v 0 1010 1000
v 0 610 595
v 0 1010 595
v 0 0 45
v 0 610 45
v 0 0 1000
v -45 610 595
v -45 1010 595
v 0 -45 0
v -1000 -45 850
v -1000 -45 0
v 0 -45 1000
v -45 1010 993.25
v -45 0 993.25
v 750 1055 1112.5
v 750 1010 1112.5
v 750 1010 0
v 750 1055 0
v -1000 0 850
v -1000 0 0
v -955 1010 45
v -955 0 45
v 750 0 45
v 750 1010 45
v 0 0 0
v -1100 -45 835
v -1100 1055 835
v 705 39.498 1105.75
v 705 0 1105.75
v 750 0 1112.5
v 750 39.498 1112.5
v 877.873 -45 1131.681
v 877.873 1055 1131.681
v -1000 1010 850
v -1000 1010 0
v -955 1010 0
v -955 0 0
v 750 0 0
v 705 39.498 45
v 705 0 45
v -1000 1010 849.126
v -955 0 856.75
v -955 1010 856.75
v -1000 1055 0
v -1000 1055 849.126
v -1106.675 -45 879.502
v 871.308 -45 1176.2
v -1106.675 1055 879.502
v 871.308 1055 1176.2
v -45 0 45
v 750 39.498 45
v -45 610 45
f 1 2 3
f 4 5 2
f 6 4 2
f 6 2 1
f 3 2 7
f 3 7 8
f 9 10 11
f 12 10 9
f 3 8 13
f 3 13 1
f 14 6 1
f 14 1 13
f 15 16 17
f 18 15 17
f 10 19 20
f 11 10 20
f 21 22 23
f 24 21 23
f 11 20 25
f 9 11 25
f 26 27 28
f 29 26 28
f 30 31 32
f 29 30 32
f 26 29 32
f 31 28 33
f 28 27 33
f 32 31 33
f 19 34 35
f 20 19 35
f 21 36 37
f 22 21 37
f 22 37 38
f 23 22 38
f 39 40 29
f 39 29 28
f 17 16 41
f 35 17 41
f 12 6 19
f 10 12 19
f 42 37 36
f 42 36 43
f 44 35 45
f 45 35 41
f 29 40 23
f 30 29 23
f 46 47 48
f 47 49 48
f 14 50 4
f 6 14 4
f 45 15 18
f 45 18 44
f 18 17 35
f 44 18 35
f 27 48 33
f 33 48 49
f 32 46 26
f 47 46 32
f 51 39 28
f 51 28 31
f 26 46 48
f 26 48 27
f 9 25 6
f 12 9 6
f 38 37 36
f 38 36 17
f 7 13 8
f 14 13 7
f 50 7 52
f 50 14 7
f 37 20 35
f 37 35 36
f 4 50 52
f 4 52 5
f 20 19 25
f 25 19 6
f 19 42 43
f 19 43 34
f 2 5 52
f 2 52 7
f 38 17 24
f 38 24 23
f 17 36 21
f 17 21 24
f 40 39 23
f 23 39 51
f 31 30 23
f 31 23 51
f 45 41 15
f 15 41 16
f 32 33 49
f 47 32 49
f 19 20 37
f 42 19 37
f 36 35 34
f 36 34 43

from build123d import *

# Parameters (mm, degrees)
F1_DEPTH  = 1010
F2_DEPTH  = 1055
F3_DEPTH  = 45
F5_DEPTH  = 45
F6_W      = 400
F6_H      = 550
F7_DEPTH  = 45
F8_W      = 1705
F8_H      = 1010
F9_DEPTH  = 45
F10_W     = 45
F10_H     = 39.4975058734
F11_DEPTH = 1067.5
F13_DEPTH = 45


with BuildPart() as f1:
    # F0 (on Front) → F1 (new body)
    with BuildSketch(Plane.XZ):
        Polygon((-955, 0), (-955, 856.75), (-1000, 850), (-1000, 0), align=None)
    extrude(amount=-F1_DEPTH)


with BuildPart() as f1b:
    # F0 (on Front) → F1, piece 2 (new body)
    with BuildSketch(Plane.XZ):
        Polygon((0, 45), (0, 1000), (-45, 993.25), (-45, 45), align=None)
    extrude(amount=-F1_DEPTH)

    # F6 (on face) → F7 (cut, through all)
    with BuildSketch(Plane.YZ):
        with Locations((810, 320)):
            Rectangle(F6_W, F6_H)
    extrude(amount=-F7_DEPTH, mode=Mode.SUBTRACT)


with BuildPart() as f2:
    # F0 (on Front) → F2 (new body)
    with BuildSketch(Plane.XZ):
        Polygon((-45, 993.25), (0, 1000), (877.8727057366, 1131.6809058605), (871.3081797654, 1176.1996609012), (-1106.6753203819, 879.5021358791), (-1100, 835), (-1000, 850), (-955, 856.75), align=None)
    extrude(amount=-F2_DEPTH)

    # F0 (on Front) → F3 (join)
    with BuildSketch(Plane.XZ):
        Polygon((-45, 993.25), (0, 1000), (877.8727057366, 1131.6809058605), (871.3081797654, 1176.1996609012), (-1106.6753203819, 879.5021358791), (-1100, 835), (-1000, 850), (-955, 856.75), align=None)
    extrude(amount=F3_DEPTH)

    # F10 (on face) → F11 (join, through all)
    with BuildSketch(Plane.XY.offset(45)):
        with Locations((727.5, 19.7487529367)):
            Rectangle(F10_W, F10_H)
    extrude(amount=F11_DEPTH)


with BuildPart() as f5:
    # F4 (on face) → F5 (new body)
    with BuildSketch(Plane(origin=(0, 1010, 0), x_dir=(-1, 0, 0), z_dir=(0, 1, 0))):
        Polygon((-750, 1112.5), (-750, 0), (1000, 0), (1000, 849.1256712336), align=None)
    extrude(amount=F5_DEPTH)


with BuildPart() as f9:
    # F8 (on face) → F9 (new body)
    with BuildSketch(Plane(origin=(0, 0, 0), x_dir=(1, 0, 0), z_dir=(0, 0, -1))):
        with Locations((-102.5, -505)):
            Rectangle(F8_W, F8_H)
    extrude(amount=-F9_DEPTH)


with BuildPart() as f13:
    # F12 (on face) → F13 (new body)
    with BuildSketch(Plane.XZ):
        Polygon((0, 1000), (-955, 856.75), (-955, 0), (0, 0), align=None)
        Polygon((-955, 856.75), (-1000, 850), (-1000, 0), (-955, 0), align=None)
    extrude(amount=F13_DEPTH)


solid = Compound([f1.part, f1b.part, f2.part, f5.part, f9.part, f13.part])
